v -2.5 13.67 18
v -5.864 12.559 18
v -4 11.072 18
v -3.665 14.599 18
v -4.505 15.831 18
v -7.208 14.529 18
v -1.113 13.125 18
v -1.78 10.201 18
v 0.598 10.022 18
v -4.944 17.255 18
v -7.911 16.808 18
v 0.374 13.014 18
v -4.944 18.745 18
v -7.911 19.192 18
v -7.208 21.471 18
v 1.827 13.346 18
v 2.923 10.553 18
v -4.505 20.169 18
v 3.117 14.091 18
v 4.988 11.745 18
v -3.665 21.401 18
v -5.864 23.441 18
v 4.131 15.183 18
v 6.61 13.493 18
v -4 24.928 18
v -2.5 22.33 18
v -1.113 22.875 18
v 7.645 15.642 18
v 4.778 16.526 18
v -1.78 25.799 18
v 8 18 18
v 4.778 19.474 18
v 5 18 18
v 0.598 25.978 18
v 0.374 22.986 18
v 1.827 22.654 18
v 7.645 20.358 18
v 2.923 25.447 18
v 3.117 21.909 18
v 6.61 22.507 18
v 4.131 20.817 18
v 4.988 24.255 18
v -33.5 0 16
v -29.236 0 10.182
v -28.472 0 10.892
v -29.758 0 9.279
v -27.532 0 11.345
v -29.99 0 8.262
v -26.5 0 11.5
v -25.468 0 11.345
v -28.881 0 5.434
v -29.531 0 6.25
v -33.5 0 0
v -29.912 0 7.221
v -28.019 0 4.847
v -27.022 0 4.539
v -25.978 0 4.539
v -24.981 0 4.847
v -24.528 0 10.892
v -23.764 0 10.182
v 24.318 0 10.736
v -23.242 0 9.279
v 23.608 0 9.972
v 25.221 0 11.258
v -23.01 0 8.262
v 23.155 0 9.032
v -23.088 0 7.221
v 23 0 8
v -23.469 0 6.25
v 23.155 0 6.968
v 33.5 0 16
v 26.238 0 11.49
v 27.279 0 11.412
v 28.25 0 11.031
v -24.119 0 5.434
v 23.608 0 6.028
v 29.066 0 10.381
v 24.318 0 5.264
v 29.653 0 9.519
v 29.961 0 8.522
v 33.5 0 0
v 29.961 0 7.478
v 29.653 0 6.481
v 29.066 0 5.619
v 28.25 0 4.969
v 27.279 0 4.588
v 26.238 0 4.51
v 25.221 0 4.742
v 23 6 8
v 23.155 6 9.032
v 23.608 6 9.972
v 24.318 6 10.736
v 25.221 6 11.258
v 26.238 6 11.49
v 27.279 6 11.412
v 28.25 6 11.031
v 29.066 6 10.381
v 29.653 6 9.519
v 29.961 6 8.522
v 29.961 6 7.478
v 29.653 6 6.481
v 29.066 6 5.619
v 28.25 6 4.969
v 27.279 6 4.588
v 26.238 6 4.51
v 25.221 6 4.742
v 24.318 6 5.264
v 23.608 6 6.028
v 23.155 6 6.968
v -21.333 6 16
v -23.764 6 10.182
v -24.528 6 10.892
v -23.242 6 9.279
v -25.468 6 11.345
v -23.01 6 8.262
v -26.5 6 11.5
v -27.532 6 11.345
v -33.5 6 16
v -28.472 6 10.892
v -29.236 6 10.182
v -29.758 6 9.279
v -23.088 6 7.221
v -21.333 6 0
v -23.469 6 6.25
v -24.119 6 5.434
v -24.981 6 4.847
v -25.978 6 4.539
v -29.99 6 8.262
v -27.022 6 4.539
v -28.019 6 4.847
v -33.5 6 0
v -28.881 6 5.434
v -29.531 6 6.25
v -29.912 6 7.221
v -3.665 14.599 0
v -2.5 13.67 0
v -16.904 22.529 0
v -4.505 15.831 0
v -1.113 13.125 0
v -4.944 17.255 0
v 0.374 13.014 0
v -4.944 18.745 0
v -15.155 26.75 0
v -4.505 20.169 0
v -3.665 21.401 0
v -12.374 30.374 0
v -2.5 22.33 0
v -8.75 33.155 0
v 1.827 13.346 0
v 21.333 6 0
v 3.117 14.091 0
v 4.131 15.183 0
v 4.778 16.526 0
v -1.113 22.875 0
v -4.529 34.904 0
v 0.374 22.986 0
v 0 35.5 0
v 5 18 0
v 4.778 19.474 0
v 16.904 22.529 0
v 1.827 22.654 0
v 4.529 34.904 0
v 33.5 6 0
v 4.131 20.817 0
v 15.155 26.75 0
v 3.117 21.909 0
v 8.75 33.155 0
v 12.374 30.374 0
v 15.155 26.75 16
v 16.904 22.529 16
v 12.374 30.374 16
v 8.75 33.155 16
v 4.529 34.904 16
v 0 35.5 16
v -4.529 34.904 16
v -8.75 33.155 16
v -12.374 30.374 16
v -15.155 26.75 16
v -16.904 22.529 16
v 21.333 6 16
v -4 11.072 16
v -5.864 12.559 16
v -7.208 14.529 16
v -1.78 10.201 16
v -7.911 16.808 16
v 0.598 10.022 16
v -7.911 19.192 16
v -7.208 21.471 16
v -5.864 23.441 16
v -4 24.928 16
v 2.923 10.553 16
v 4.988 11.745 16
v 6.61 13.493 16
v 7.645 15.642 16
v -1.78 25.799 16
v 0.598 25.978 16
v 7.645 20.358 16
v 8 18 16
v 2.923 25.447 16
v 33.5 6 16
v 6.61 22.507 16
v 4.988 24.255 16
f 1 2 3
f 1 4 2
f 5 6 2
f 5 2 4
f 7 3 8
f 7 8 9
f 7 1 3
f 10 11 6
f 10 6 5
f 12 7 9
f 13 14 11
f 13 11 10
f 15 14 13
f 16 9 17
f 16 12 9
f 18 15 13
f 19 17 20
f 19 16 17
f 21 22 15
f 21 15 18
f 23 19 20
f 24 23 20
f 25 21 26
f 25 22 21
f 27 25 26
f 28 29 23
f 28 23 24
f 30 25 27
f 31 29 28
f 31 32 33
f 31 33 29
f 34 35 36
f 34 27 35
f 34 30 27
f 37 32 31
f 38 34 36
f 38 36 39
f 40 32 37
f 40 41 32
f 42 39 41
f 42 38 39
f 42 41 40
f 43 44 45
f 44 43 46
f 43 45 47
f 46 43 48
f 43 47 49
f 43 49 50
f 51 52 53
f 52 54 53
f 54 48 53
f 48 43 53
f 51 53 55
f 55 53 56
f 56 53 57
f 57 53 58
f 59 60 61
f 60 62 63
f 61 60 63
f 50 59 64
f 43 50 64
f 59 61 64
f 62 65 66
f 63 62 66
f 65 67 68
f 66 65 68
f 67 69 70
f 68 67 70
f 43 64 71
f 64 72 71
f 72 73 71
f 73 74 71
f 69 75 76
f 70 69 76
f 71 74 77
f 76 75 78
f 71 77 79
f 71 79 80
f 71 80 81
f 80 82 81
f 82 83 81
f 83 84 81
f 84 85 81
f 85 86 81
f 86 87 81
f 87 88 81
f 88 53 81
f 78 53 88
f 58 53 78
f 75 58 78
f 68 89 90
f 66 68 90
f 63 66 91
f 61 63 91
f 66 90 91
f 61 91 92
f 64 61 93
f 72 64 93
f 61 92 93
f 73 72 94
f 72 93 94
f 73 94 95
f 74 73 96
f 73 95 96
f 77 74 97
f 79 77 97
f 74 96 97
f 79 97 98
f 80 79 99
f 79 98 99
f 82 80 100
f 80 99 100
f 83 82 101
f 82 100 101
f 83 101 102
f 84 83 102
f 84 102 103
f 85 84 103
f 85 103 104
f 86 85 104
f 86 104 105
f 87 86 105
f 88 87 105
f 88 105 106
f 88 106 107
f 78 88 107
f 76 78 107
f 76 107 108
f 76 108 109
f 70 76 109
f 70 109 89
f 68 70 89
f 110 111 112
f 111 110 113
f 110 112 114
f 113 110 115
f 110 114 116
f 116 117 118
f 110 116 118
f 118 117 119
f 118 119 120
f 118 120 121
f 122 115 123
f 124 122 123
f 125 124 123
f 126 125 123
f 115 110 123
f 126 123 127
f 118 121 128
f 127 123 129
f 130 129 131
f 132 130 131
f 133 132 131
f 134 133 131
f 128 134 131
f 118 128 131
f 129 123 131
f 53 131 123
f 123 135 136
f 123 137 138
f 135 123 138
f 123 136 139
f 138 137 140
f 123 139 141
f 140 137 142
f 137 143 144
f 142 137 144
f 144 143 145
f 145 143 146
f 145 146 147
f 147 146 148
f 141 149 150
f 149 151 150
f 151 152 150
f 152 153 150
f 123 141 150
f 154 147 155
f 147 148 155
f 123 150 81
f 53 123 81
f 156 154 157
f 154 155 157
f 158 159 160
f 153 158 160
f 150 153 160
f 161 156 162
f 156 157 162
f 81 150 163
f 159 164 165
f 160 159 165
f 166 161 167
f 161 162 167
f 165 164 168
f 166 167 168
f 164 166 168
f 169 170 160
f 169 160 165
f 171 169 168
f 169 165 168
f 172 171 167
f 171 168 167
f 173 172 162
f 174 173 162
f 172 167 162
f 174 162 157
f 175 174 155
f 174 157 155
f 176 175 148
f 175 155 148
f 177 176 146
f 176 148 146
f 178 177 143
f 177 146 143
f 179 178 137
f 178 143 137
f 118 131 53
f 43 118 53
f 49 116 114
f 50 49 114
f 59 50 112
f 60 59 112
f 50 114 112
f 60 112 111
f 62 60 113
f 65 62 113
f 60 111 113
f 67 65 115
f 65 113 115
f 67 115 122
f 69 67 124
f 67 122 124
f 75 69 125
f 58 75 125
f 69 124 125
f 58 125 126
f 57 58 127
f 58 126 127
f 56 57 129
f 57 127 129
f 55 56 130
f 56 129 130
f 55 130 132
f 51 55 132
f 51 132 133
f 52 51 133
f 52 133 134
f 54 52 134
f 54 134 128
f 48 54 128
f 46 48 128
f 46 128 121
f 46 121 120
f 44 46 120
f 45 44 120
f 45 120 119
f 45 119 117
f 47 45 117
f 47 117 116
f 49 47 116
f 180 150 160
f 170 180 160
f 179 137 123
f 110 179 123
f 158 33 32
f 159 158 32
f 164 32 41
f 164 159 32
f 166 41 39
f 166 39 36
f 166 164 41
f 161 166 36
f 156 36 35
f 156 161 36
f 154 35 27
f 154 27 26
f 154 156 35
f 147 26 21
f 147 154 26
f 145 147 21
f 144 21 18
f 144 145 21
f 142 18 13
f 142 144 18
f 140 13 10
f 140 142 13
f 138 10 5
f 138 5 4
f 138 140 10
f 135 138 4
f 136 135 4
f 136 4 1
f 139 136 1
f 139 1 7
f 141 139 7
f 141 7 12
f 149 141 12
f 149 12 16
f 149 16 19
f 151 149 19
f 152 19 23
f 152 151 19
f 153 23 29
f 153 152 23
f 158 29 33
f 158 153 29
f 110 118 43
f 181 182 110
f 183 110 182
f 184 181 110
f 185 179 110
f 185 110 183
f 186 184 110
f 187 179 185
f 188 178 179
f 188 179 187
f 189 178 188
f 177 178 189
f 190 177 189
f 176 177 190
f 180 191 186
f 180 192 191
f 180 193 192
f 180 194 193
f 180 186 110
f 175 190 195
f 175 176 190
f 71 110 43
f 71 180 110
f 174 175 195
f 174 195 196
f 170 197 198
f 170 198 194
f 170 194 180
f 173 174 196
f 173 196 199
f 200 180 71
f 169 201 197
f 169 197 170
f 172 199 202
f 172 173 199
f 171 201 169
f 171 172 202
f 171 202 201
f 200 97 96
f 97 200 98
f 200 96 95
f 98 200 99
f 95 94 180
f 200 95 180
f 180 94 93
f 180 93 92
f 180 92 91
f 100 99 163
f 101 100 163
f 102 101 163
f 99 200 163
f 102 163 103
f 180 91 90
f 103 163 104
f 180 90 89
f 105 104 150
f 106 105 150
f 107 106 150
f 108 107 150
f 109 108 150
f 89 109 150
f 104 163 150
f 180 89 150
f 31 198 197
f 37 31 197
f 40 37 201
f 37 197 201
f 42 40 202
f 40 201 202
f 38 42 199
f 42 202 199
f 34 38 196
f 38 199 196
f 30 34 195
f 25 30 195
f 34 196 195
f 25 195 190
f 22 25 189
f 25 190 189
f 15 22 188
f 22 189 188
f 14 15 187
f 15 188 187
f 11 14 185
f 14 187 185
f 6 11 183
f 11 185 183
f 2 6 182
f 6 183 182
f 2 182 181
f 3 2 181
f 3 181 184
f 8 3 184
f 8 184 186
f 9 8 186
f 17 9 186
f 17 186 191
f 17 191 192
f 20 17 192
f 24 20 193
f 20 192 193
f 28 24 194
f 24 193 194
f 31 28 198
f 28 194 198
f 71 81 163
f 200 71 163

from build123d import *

# Parameters (mm, degrees)
SKETCH_1_R          = 17.5
SKETCH_1_R_2        = 5
EXTRUDE_1_DEPTH     = 16
SKETCH_2_R          = 8
SKETCH_2_R_2        = 5
EXTRUDE_2_DEPTH     = 2
SKETCH_3_R          = 3.5
CUT_EXTRUDE_1_DEPTH = 12


with BuildPart() as part:
    # 草图1 → 凸台-拉伸1 (new body)
    # profile 1 of 2: a face of its own
    with BuildSketch(Plane.XY):
        with BuildLine():
            Line((-33.5, 6), (-33.5, 0))
            Line((-33.5, 0), (33.5, 0))
            Line((33.5, 0), (33.5, 6))
            Line((33.5, 6), (21.332723466, 6))
            Line((21.332723466, 6), (16.90370196, 22.529333289))
            ThreePointArc((16.90370196, 22.529333289), (17.350285074, 20.284208364), (17.5, 18))
            ThreePointArc((17.5, 18), (-2.284208364, 0.649714926), (-16.90370196, 22.529333289))
            Line((-16.90370196, 22.529333289), (-21.332723466, 6))
            Line((-21.332723466, 6), (-33.5, 6))
        make_face()
    # profile 2 of 2: a face of its own
    with BuildSketch(Plane.XY):
        with Locations((0, 18)):
            Circle(SKETCH_1_R)
        with Locations((0, 18)):
            Circle(SKETCH_1_R_2, mode=Mode.SUBTRACT)
    extrude(amount=EXTRUDE_1_DEPTH)

    # 草图2 → 凸台-拉伸2 (add)
    with BuildSketch(Plane.XY.offset(16)):
        with Locations((0, 18)):
            Circle(SKETCH_2_R)
        with Locations((0, 18)):
            Circle(SKETCH_2_R_2, mode=Mode.SUBTRACT)
    extrude(amount=EXTRUDE_2_DEPTH)

    # 草图3 → 切除-拉伸1 (cut)
    with BuildSketch(Plane(origin=(0, 6, 0), x_dir=(1, 0, 0), z_dir=(0, 1, 0))):
        with Locations(Location((-26.5, -8, 0), (0, 0, 270))):
            Circle(SKETCH_3_R)
        with Locations(Location((26.5, -8, 0), (0, 0, 180))):
            Circle(SKETCH_3_R)
    extrude(amount=-CUT_EXTRUDE_1_DEPTH, mode=Mode.SUBTRACT)


solid = part.part
